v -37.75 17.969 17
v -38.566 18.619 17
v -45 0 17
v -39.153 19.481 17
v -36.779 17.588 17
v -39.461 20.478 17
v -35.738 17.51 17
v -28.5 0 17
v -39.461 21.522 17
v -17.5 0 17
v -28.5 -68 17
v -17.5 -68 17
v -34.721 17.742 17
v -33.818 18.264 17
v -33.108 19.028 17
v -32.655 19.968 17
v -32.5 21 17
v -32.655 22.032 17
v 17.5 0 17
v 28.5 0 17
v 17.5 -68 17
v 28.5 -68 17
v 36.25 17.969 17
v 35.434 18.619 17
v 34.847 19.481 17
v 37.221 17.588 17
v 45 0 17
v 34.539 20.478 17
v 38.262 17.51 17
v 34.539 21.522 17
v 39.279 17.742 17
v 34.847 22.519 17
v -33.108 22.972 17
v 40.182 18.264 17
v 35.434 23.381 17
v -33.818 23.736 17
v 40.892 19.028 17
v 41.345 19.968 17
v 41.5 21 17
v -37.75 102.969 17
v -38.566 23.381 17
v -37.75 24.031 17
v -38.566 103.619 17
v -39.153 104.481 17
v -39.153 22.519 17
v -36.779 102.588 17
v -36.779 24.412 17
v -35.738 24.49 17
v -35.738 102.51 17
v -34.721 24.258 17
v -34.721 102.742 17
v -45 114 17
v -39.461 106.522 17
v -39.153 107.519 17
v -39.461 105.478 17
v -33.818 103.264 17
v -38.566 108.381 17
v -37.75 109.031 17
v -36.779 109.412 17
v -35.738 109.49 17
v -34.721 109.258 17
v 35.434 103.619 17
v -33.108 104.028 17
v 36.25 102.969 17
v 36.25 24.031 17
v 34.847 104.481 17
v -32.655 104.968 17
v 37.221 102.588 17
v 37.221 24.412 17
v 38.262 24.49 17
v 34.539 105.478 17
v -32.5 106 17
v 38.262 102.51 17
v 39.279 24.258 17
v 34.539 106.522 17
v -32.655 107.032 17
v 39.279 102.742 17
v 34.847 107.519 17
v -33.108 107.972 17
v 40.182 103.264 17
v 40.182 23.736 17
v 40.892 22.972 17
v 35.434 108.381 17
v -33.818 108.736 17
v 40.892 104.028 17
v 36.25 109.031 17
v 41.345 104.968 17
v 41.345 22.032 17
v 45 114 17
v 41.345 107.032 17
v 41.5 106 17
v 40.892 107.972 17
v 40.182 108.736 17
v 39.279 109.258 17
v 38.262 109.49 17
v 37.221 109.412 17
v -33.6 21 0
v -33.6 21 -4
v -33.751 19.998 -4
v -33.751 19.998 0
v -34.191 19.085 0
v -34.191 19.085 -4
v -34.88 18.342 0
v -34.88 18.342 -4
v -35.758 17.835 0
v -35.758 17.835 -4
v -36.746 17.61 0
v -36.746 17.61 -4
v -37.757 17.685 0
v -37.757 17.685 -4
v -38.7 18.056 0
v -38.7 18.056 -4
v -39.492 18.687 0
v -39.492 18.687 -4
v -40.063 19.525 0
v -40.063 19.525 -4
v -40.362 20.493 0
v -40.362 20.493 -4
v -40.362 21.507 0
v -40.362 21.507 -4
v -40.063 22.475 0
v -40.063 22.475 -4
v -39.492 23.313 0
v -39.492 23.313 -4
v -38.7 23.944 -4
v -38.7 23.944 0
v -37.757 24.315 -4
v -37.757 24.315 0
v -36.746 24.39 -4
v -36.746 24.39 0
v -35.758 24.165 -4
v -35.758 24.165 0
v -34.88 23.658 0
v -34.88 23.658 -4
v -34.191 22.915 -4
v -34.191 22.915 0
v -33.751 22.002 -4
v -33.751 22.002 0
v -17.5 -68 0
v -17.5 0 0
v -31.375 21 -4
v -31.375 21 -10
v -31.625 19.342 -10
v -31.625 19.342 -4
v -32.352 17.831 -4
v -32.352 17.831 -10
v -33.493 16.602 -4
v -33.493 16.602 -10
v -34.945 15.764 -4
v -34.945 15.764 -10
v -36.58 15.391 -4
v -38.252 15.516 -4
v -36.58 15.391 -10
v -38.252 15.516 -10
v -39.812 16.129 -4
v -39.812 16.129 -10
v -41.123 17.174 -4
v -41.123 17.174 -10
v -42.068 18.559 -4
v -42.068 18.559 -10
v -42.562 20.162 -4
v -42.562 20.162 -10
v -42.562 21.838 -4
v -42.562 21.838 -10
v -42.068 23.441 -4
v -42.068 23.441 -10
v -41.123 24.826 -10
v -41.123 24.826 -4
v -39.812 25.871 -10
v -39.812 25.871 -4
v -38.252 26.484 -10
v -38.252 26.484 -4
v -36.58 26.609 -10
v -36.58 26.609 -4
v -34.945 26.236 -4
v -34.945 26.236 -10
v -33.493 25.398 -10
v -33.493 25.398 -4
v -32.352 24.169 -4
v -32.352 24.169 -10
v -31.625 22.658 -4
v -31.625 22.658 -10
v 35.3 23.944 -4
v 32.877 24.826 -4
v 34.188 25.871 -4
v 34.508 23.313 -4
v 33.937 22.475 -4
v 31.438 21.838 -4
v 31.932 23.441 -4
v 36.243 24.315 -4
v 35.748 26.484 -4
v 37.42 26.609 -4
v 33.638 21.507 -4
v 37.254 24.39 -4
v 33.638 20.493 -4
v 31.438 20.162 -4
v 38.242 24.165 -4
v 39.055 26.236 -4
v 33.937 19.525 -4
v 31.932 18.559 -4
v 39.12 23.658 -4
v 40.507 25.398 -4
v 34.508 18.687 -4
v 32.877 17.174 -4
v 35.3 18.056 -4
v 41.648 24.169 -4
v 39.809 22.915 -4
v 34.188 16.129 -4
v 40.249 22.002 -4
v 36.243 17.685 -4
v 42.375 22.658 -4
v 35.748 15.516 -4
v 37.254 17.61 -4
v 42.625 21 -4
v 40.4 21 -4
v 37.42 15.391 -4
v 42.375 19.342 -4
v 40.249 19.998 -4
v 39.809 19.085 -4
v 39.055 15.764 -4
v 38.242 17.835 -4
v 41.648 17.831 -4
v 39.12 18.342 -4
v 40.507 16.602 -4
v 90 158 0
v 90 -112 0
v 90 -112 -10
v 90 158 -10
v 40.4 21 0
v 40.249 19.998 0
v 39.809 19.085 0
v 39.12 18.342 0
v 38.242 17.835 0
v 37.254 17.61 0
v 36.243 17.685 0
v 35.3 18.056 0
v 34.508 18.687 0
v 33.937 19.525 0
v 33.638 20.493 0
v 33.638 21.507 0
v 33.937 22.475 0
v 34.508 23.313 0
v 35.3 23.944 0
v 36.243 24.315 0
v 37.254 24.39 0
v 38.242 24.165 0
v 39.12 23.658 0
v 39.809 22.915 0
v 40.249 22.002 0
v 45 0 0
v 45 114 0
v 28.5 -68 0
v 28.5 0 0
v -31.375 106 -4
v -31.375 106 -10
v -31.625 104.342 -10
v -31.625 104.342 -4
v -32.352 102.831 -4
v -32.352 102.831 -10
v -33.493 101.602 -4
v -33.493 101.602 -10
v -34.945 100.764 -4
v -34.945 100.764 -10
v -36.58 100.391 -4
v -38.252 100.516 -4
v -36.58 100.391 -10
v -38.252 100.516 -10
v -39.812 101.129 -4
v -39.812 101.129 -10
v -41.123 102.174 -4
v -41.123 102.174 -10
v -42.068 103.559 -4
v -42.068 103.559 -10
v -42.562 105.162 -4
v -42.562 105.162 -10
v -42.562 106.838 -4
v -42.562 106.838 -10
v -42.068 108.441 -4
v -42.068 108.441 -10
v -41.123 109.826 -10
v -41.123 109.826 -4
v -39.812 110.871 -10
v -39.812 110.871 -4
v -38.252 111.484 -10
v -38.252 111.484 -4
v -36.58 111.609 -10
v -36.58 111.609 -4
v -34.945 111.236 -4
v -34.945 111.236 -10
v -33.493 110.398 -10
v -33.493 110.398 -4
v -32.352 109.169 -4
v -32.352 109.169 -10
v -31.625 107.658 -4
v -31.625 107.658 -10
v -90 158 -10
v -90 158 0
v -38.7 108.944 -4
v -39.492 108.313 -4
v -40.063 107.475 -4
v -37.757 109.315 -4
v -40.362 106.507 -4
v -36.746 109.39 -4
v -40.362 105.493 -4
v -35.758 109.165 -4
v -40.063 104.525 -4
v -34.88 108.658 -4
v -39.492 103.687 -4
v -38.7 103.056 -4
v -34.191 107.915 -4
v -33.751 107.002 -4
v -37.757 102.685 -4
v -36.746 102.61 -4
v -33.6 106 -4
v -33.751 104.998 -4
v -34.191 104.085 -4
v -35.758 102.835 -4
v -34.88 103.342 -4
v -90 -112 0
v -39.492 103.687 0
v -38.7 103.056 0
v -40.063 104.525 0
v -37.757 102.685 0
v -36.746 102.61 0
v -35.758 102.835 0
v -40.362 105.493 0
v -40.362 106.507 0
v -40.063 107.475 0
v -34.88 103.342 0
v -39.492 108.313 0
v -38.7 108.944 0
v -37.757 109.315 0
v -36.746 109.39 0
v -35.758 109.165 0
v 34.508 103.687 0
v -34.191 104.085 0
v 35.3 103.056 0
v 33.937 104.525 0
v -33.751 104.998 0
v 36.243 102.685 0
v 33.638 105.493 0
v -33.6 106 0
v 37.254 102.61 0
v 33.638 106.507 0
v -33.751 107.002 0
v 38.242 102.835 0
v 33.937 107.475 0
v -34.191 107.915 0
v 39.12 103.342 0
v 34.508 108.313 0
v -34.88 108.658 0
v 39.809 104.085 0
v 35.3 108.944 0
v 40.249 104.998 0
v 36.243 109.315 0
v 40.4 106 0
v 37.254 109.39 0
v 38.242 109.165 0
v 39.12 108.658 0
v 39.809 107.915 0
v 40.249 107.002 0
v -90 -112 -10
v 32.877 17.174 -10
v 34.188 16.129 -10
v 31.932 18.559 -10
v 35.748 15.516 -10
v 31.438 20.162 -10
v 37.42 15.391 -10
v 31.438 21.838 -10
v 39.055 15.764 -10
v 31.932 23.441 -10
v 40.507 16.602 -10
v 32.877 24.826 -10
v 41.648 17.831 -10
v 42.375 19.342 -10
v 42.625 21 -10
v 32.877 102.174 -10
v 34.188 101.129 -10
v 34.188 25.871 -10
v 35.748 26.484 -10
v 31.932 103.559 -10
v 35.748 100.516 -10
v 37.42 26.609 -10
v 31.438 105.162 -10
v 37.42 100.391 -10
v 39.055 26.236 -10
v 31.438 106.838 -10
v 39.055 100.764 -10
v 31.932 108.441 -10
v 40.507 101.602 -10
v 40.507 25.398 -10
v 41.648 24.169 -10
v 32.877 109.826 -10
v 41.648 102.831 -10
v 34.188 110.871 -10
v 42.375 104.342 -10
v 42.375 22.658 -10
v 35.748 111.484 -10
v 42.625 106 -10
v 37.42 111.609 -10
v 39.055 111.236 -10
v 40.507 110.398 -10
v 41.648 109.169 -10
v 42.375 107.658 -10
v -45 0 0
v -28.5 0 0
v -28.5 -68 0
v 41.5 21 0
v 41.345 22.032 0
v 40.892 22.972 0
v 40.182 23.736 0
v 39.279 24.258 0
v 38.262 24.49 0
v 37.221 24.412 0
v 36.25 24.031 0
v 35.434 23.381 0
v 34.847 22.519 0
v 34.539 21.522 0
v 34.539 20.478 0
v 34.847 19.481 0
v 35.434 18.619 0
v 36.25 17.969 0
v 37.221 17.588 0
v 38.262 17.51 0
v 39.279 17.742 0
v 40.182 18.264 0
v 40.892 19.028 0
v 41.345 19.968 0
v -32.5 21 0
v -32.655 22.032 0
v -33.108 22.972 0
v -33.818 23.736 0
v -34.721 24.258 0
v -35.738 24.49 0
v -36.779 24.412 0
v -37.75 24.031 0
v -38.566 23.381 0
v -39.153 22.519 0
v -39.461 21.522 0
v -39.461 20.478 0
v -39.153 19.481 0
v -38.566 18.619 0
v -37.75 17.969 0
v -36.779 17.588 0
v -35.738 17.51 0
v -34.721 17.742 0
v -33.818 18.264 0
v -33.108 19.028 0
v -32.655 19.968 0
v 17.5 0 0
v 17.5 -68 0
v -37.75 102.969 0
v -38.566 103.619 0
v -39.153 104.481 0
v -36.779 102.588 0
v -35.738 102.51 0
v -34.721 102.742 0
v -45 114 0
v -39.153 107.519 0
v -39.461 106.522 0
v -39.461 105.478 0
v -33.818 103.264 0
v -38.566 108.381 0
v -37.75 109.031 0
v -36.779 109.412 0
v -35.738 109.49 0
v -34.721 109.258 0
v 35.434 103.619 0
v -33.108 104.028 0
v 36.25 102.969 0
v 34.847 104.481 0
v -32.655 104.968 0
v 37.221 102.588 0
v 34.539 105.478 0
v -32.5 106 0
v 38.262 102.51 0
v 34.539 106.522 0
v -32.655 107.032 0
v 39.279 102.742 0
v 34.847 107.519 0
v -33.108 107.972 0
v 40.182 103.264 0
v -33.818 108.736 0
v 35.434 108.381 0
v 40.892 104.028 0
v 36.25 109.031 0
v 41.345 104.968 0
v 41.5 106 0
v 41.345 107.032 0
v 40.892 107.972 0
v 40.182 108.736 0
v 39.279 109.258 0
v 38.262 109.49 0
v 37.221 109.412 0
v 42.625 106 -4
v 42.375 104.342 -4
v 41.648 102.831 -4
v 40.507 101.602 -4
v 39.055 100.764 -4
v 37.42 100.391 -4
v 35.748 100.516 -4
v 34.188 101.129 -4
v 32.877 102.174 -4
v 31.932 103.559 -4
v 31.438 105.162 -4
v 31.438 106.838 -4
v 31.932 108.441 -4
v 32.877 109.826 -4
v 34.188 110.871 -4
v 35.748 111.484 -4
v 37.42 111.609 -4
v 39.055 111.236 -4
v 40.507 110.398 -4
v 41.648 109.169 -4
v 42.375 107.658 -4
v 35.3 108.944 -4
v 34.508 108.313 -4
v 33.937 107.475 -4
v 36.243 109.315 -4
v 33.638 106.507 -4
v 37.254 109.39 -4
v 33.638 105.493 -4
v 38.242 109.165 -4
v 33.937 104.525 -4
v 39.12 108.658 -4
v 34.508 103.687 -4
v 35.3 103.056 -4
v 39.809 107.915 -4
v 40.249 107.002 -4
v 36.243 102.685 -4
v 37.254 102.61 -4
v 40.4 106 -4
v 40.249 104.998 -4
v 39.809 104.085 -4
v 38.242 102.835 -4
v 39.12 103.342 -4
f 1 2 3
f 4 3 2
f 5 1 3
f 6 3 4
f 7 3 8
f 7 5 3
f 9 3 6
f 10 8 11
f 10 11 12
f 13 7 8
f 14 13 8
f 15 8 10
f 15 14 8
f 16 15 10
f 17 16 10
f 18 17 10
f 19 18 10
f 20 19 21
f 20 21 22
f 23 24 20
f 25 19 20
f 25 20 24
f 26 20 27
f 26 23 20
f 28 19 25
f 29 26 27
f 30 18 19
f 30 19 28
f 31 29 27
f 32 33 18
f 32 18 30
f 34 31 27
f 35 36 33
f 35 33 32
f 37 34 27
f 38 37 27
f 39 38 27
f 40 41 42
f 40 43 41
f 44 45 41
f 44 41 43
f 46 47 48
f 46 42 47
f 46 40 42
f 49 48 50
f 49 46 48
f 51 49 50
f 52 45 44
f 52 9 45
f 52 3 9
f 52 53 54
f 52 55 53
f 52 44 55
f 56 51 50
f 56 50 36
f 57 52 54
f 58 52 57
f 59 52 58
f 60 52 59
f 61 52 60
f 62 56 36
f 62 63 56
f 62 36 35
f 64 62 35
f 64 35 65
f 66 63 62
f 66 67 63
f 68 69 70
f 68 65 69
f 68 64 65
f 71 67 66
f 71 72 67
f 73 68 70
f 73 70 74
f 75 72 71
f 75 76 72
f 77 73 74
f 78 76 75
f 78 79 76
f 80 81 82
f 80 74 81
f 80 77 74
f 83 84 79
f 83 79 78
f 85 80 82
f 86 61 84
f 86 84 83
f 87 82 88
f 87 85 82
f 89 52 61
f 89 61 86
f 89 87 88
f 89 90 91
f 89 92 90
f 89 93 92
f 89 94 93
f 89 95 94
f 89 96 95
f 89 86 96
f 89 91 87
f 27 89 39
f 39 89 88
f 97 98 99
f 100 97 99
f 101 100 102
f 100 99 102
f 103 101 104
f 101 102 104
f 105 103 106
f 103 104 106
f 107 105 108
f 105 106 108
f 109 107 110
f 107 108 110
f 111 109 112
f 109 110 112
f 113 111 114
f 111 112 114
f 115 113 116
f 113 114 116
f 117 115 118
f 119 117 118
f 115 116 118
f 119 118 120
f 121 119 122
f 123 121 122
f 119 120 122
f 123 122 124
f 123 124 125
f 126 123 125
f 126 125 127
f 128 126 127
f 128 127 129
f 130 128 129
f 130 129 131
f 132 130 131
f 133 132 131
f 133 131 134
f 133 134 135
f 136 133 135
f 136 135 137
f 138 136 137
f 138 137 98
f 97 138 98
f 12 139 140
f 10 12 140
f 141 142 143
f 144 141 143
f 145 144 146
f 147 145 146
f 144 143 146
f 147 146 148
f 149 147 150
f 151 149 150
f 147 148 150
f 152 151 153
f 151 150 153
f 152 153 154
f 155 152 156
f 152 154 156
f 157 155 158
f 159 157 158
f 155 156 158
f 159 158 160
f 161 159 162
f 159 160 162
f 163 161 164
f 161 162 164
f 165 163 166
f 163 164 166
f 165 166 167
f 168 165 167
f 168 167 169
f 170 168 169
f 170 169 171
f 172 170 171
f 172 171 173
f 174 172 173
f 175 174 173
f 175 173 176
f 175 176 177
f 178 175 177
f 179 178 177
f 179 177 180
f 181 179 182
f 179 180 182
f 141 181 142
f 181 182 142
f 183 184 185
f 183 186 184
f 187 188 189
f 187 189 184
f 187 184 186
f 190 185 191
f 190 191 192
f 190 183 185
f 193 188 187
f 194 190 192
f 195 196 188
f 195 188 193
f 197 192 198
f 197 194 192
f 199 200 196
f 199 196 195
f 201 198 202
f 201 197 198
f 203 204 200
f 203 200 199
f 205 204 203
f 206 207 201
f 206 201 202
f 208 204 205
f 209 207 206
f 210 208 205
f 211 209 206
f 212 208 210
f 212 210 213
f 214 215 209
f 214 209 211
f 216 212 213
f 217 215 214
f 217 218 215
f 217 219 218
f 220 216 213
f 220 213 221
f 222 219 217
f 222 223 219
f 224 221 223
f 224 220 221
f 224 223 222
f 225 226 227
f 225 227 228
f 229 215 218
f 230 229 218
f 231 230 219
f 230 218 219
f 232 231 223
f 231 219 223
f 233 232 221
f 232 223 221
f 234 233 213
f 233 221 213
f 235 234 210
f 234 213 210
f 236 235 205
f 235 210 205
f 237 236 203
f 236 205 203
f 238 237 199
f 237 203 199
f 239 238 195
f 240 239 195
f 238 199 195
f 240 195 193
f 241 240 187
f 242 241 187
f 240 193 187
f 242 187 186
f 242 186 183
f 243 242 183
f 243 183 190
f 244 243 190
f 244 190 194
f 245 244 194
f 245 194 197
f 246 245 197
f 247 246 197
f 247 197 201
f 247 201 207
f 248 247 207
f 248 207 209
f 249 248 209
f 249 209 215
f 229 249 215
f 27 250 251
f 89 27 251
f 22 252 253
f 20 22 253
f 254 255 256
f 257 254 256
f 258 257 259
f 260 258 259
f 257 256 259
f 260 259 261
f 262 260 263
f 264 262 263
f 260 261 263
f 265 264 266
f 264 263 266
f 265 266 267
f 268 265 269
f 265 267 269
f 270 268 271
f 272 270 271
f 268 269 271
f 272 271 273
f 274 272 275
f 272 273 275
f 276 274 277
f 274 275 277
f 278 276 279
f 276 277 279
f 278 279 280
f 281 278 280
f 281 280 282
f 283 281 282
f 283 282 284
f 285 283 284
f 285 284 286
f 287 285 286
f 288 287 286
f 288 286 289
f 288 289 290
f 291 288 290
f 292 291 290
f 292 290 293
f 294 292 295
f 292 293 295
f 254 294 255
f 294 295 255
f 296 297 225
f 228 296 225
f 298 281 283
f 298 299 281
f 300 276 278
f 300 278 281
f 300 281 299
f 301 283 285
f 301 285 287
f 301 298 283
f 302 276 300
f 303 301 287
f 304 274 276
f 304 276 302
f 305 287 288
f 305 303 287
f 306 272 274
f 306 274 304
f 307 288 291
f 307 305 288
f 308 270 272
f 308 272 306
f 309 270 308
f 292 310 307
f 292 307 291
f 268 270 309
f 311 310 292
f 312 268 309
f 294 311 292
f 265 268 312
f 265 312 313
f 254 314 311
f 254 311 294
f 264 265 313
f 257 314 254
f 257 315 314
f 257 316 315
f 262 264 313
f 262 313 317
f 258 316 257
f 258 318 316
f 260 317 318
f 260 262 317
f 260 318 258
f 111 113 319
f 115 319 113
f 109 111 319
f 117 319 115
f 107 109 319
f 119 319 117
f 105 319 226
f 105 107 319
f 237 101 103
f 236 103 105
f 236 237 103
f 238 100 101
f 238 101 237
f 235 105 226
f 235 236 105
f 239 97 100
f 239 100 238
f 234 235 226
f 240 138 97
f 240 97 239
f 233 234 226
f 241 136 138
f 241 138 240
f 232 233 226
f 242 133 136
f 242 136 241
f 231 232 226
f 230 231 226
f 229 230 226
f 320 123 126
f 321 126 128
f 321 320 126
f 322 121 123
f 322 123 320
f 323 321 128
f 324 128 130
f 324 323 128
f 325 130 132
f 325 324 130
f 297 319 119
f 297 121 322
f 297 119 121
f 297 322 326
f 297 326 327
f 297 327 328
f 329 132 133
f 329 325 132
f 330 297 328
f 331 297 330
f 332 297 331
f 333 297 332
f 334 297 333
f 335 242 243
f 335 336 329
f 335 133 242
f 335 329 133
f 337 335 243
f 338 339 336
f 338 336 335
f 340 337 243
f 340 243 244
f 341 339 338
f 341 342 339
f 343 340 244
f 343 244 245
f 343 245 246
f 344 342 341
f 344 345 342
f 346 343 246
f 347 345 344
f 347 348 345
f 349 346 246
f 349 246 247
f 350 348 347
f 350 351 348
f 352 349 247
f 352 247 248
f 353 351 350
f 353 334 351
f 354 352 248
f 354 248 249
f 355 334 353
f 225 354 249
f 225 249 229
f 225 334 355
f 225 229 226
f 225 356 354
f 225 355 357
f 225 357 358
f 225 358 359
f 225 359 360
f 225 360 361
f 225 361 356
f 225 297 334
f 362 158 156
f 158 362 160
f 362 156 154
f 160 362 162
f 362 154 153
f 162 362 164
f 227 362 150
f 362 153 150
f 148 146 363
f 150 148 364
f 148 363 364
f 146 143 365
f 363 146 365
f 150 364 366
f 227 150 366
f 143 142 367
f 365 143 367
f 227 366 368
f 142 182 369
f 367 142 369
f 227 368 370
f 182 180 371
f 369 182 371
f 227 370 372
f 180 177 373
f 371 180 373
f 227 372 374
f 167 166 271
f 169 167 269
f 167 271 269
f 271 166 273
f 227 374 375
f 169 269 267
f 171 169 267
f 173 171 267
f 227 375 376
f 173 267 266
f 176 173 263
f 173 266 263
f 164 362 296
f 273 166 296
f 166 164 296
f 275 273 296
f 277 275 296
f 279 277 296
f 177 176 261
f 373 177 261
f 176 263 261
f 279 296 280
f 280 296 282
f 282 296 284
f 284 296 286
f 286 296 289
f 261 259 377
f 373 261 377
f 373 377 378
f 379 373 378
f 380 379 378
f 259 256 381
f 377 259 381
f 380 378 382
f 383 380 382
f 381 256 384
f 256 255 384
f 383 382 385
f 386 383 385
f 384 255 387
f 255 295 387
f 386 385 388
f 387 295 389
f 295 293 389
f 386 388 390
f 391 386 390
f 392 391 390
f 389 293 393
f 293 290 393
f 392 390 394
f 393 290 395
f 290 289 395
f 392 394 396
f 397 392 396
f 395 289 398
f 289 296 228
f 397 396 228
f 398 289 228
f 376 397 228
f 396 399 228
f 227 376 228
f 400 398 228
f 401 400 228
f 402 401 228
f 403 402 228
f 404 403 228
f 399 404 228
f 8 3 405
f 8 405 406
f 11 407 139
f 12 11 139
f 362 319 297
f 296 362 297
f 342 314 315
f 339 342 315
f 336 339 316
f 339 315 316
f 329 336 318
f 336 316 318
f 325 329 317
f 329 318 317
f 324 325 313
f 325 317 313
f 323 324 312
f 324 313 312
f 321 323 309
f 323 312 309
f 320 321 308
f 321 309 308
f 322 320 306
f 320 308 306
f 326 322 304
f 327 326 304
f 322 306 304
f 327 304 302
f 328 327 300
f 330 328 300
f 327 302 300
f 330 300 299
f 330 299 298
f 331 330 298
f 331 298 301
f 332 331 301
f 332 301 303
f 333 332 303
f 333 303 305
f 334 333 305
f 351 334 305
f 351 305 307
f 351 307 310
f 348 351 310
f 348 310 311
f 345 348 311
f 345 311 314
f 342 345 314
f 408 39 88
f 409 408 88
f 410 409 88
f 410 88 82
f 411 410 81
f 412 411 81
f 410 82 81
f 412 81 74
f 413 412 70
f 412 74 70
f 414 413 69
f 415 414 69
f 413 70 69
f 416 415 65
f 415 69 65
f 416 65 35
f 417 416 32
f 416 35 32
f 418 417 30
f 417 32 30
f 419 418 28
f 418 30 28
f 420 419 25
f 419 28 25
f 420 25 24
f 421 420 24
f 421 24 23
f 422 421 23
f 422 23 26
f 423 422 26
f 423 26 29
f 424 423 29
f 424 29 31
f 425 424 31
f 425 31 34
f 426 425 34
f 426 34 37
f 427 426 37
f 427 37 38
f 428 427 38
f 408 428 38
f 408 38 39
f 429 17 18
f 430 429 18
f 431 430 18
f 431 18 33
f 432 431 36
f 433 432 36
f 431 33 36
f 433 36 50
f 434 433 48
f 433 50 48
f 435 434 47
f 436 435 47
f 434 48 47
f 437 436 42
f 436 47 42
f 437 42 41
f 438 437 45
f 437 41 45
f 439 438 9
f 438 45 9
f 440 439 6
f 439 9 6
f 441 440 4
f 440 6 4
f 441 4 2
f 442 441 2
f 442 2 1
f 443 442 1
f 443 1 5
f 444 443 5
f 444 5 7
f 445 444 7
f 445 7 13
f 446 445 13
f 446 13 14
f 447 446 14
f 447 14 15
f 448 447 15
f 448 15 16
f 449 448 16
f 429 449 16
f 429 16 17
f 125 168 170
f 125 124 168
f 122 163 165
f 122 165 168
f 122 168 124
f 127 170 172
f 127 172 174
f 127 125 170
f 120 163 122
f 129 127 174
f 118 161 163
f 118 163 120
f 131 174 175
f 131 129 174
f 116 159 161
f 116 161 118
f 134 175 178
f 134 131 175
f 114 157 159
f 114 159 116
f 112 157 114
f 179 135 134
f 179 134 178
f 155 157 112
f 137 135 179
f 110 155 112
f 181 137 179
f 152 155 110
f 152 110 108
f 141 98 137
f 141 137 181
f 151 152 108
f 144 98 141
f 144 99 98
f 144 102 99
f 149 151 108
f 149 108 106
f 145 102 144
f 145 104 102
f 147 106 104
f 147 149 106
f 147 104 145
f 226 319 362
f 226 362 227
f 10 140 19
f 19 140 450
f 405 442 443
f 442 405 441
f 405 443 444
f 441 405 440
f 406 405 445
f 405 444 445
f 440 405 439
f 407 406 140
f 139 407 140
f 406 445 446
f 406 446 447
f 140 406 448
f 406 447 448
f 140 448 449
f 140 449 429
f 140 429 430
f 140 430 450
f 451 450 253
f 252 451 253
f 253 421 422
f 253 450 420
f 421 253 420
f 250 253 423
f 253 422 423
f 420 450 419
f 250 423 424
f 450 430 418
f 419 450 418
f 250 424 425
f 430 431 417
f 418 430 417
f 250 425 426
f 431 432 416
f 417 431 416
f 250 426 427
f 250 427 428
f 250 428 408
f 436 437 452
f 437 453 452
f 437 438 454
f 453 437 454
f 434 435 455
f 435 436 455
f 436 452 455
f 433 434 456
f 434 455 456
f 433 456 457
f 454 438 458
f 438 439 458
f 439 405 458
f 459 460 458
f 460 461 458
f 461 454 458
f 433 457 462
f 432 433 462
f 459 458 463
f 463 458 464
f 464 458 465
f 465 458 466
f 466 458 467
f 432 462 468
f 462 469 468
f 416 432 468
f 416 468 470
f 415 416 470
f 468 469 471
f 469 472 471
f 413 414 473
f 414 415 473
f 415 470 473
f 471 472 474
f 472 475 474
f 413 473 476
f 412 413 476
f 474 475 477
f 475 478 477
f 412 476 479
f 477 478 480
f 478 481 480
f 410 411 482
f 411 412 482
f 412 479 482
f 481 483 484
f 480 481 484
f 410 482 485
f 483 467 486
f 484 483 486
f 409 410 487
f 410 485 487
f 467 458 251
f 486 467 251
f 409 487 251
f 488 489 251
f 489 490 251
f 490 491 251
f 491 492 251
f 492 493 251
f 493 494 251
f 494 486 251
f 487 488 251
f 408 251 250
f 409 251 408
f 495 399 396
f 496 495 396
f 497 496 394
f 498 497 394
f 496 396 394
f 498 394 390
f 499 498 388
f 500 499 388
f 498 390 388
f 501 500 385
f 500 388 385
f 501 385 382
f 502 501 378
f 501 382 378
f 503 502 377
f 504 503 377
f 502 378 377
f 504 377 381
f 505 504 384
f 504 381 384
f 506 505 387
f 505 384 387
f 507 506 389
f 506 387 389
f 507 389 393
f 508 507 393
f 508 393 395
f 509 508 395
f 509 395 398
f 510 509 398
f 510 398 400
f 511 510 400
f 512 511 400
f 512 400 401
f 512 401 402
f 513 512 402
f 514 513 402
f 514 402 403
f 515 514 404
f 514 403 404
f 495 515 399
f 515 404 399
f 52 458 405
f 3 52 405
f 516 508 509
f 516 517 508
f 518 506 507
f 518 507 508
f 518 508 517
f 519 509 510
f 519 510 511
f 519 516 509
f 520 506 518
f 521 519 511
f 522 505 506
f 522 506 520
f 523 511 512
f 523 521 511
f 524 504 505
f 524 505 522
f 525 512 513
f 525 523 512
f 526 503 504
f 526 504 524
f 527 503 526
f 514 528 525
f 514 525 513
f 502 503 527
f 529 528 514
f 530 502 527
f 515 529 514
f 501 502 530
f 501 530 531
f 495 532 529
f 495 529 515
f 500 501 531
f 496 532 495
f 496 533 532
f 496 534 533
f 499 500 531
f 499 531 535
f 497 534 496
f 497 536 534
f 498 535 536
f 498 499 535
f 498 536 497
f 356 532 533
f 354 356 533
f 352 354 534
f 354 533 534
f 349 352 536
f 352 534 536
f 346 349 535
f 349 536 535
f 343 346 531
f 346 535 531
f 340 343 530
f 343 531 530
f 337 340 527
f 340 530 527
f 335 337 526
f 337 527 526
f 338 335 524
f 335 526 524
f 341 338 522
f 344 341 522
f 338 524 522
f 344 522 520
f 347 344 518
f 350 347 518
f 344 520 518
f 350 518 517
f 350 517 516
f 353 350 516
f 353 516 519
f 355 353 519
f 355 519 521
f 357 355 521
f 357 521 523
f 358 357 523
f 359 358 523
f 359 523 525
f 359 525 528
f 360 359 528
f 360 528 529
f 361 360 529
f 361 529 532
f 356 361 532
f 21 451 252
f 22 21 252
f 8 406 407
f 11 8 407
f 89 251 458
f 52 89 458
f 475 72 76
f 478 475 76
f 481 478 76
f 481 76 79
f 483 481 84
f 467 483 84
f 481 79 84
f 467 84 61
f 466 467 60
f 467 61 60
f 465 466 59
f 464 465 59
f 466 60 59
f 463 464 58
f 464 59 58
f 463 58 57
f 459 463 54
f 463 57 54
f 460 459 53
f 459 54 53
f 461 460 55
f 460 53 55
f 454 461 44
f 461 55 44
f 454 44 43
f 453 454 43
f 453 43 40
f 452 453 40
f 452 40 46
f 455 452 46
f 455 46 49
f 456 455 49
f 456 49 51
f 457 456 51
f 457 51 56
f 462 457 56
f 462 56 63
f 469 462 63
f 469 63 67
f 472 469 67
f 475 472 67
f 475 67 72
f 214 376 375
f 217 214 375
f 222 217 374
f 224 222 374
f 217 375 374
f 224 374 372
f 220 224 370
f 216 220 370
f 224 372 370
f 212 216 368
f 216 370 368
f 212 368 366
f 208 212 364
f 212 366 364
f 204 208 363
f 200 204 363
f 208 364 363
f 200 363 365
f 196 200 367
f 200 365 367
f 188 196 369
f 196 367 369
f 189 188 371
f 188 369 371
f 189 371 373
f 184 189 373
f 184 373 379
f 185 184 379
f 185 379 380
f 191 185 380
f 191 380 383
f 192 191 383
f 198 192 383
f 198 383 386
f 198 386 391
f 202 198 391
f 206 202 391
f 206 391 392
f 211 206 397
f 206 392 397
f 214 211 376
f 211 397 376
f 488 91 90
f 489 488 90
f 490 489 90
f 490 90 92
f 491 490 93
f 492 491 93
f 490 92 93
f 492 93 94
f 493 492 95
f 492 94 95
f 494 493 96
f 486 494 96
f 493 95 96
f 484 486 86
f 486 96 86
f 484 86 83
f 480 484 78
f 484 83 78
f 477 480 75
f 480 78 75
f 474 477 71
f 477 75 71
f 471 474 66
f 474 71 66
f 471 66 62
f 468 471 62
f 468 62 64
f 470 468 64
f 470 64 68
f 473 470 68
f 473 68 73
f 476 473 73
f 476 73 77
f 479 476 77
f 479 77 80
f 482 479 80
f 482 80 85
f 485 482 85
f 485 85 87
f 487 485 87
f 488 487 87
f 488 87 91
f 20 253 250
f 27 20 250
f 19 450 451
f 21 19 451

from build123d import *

# Parameters (mm, degrees)
F1_DEPTH = 17
F2_R     = 3.5
F3_DEPTH = 17.001
F4_W     = 180
F4_H     = 270
F5_DEPTH = 10
F6_R     = 3.4
F7_DEPTH = 10
F8_R     = 5.625
F9_DEPTH = 6


with BuildPart() as f1:
    # F0 (on Top) → F1 (new body)
    with BuildSketch(Plane.XY):
        Polygon((-45, 114), (-45, 0), (-28.5, 0), (-28.5, -68), (-17.5, -68), (-17.5, 0), (17.5, 0), (17.5, -68), (28.5, -68), (28.5, 0), (45, 0), (45, 114), align=None)
    extrude(amount=F1_DEPTH)

    # F2 (on face) → F3 (cut, through all)
    with BuildSketch(Plane.XY.offset(17)):
        with Locations((-36, 106)):
            Circle(F2_R)
        with Locations((-36, 21)):
            Circle(F2_R)
        with Locations((38, 106)):
            Circle(F2_R)
        with Locations((38, 21)):
            Circle(F2_R)
    extrude(amount=-F3_DEPTH, mode=Mode.SUBTRACT)


with BuildPart() as f5:
    # F4 (on Top) → F5 (new body)
    with BuildSketch(Plane.XY):
        with Locations((0, 23)):
            Rectangle(F4_W, F4_H)
    extrude(amount=-F5_DEPTH)

    # F6 (on face) → F7 (cut)
    with BuildSketch(Plane(origin=(0, 0, -10), x_dir=(1, 0, 0), z_dir=(0, 0, -1))):
        with Locations((37, -106)):
            Circle(F6_R)
        with Locations((-37, -106)):
            Circle(F6_R)
        with Locations((37, -21)):
            Circle(F6_R)
        with Locations((-37, -21)):
            Circle(F6_R)
    extrude(amount=-F7_DEPTH, mode=Mode.SUBTRACT)

    # F8 (on face) → F9 (cut)
    with BuildSketch(Plane(origin=(0, 0, -10), x_dir=(1, 0, 0), z_dir=(0, 0, -1))):
        with Locations((37, -21)):
            Circle(F8_R)
        with Locations((37, -106)):
            Circle(F8_R)
        with Locations((-37, -106)):
            Circle(F8_R)
        with Locations((-37, -21)):
            Circle(F8_R)
    extrude(amount=-F9_DEPTH, mode=Mode.SUBTRACT)


solid = Compound([f1.part, f5.part])
